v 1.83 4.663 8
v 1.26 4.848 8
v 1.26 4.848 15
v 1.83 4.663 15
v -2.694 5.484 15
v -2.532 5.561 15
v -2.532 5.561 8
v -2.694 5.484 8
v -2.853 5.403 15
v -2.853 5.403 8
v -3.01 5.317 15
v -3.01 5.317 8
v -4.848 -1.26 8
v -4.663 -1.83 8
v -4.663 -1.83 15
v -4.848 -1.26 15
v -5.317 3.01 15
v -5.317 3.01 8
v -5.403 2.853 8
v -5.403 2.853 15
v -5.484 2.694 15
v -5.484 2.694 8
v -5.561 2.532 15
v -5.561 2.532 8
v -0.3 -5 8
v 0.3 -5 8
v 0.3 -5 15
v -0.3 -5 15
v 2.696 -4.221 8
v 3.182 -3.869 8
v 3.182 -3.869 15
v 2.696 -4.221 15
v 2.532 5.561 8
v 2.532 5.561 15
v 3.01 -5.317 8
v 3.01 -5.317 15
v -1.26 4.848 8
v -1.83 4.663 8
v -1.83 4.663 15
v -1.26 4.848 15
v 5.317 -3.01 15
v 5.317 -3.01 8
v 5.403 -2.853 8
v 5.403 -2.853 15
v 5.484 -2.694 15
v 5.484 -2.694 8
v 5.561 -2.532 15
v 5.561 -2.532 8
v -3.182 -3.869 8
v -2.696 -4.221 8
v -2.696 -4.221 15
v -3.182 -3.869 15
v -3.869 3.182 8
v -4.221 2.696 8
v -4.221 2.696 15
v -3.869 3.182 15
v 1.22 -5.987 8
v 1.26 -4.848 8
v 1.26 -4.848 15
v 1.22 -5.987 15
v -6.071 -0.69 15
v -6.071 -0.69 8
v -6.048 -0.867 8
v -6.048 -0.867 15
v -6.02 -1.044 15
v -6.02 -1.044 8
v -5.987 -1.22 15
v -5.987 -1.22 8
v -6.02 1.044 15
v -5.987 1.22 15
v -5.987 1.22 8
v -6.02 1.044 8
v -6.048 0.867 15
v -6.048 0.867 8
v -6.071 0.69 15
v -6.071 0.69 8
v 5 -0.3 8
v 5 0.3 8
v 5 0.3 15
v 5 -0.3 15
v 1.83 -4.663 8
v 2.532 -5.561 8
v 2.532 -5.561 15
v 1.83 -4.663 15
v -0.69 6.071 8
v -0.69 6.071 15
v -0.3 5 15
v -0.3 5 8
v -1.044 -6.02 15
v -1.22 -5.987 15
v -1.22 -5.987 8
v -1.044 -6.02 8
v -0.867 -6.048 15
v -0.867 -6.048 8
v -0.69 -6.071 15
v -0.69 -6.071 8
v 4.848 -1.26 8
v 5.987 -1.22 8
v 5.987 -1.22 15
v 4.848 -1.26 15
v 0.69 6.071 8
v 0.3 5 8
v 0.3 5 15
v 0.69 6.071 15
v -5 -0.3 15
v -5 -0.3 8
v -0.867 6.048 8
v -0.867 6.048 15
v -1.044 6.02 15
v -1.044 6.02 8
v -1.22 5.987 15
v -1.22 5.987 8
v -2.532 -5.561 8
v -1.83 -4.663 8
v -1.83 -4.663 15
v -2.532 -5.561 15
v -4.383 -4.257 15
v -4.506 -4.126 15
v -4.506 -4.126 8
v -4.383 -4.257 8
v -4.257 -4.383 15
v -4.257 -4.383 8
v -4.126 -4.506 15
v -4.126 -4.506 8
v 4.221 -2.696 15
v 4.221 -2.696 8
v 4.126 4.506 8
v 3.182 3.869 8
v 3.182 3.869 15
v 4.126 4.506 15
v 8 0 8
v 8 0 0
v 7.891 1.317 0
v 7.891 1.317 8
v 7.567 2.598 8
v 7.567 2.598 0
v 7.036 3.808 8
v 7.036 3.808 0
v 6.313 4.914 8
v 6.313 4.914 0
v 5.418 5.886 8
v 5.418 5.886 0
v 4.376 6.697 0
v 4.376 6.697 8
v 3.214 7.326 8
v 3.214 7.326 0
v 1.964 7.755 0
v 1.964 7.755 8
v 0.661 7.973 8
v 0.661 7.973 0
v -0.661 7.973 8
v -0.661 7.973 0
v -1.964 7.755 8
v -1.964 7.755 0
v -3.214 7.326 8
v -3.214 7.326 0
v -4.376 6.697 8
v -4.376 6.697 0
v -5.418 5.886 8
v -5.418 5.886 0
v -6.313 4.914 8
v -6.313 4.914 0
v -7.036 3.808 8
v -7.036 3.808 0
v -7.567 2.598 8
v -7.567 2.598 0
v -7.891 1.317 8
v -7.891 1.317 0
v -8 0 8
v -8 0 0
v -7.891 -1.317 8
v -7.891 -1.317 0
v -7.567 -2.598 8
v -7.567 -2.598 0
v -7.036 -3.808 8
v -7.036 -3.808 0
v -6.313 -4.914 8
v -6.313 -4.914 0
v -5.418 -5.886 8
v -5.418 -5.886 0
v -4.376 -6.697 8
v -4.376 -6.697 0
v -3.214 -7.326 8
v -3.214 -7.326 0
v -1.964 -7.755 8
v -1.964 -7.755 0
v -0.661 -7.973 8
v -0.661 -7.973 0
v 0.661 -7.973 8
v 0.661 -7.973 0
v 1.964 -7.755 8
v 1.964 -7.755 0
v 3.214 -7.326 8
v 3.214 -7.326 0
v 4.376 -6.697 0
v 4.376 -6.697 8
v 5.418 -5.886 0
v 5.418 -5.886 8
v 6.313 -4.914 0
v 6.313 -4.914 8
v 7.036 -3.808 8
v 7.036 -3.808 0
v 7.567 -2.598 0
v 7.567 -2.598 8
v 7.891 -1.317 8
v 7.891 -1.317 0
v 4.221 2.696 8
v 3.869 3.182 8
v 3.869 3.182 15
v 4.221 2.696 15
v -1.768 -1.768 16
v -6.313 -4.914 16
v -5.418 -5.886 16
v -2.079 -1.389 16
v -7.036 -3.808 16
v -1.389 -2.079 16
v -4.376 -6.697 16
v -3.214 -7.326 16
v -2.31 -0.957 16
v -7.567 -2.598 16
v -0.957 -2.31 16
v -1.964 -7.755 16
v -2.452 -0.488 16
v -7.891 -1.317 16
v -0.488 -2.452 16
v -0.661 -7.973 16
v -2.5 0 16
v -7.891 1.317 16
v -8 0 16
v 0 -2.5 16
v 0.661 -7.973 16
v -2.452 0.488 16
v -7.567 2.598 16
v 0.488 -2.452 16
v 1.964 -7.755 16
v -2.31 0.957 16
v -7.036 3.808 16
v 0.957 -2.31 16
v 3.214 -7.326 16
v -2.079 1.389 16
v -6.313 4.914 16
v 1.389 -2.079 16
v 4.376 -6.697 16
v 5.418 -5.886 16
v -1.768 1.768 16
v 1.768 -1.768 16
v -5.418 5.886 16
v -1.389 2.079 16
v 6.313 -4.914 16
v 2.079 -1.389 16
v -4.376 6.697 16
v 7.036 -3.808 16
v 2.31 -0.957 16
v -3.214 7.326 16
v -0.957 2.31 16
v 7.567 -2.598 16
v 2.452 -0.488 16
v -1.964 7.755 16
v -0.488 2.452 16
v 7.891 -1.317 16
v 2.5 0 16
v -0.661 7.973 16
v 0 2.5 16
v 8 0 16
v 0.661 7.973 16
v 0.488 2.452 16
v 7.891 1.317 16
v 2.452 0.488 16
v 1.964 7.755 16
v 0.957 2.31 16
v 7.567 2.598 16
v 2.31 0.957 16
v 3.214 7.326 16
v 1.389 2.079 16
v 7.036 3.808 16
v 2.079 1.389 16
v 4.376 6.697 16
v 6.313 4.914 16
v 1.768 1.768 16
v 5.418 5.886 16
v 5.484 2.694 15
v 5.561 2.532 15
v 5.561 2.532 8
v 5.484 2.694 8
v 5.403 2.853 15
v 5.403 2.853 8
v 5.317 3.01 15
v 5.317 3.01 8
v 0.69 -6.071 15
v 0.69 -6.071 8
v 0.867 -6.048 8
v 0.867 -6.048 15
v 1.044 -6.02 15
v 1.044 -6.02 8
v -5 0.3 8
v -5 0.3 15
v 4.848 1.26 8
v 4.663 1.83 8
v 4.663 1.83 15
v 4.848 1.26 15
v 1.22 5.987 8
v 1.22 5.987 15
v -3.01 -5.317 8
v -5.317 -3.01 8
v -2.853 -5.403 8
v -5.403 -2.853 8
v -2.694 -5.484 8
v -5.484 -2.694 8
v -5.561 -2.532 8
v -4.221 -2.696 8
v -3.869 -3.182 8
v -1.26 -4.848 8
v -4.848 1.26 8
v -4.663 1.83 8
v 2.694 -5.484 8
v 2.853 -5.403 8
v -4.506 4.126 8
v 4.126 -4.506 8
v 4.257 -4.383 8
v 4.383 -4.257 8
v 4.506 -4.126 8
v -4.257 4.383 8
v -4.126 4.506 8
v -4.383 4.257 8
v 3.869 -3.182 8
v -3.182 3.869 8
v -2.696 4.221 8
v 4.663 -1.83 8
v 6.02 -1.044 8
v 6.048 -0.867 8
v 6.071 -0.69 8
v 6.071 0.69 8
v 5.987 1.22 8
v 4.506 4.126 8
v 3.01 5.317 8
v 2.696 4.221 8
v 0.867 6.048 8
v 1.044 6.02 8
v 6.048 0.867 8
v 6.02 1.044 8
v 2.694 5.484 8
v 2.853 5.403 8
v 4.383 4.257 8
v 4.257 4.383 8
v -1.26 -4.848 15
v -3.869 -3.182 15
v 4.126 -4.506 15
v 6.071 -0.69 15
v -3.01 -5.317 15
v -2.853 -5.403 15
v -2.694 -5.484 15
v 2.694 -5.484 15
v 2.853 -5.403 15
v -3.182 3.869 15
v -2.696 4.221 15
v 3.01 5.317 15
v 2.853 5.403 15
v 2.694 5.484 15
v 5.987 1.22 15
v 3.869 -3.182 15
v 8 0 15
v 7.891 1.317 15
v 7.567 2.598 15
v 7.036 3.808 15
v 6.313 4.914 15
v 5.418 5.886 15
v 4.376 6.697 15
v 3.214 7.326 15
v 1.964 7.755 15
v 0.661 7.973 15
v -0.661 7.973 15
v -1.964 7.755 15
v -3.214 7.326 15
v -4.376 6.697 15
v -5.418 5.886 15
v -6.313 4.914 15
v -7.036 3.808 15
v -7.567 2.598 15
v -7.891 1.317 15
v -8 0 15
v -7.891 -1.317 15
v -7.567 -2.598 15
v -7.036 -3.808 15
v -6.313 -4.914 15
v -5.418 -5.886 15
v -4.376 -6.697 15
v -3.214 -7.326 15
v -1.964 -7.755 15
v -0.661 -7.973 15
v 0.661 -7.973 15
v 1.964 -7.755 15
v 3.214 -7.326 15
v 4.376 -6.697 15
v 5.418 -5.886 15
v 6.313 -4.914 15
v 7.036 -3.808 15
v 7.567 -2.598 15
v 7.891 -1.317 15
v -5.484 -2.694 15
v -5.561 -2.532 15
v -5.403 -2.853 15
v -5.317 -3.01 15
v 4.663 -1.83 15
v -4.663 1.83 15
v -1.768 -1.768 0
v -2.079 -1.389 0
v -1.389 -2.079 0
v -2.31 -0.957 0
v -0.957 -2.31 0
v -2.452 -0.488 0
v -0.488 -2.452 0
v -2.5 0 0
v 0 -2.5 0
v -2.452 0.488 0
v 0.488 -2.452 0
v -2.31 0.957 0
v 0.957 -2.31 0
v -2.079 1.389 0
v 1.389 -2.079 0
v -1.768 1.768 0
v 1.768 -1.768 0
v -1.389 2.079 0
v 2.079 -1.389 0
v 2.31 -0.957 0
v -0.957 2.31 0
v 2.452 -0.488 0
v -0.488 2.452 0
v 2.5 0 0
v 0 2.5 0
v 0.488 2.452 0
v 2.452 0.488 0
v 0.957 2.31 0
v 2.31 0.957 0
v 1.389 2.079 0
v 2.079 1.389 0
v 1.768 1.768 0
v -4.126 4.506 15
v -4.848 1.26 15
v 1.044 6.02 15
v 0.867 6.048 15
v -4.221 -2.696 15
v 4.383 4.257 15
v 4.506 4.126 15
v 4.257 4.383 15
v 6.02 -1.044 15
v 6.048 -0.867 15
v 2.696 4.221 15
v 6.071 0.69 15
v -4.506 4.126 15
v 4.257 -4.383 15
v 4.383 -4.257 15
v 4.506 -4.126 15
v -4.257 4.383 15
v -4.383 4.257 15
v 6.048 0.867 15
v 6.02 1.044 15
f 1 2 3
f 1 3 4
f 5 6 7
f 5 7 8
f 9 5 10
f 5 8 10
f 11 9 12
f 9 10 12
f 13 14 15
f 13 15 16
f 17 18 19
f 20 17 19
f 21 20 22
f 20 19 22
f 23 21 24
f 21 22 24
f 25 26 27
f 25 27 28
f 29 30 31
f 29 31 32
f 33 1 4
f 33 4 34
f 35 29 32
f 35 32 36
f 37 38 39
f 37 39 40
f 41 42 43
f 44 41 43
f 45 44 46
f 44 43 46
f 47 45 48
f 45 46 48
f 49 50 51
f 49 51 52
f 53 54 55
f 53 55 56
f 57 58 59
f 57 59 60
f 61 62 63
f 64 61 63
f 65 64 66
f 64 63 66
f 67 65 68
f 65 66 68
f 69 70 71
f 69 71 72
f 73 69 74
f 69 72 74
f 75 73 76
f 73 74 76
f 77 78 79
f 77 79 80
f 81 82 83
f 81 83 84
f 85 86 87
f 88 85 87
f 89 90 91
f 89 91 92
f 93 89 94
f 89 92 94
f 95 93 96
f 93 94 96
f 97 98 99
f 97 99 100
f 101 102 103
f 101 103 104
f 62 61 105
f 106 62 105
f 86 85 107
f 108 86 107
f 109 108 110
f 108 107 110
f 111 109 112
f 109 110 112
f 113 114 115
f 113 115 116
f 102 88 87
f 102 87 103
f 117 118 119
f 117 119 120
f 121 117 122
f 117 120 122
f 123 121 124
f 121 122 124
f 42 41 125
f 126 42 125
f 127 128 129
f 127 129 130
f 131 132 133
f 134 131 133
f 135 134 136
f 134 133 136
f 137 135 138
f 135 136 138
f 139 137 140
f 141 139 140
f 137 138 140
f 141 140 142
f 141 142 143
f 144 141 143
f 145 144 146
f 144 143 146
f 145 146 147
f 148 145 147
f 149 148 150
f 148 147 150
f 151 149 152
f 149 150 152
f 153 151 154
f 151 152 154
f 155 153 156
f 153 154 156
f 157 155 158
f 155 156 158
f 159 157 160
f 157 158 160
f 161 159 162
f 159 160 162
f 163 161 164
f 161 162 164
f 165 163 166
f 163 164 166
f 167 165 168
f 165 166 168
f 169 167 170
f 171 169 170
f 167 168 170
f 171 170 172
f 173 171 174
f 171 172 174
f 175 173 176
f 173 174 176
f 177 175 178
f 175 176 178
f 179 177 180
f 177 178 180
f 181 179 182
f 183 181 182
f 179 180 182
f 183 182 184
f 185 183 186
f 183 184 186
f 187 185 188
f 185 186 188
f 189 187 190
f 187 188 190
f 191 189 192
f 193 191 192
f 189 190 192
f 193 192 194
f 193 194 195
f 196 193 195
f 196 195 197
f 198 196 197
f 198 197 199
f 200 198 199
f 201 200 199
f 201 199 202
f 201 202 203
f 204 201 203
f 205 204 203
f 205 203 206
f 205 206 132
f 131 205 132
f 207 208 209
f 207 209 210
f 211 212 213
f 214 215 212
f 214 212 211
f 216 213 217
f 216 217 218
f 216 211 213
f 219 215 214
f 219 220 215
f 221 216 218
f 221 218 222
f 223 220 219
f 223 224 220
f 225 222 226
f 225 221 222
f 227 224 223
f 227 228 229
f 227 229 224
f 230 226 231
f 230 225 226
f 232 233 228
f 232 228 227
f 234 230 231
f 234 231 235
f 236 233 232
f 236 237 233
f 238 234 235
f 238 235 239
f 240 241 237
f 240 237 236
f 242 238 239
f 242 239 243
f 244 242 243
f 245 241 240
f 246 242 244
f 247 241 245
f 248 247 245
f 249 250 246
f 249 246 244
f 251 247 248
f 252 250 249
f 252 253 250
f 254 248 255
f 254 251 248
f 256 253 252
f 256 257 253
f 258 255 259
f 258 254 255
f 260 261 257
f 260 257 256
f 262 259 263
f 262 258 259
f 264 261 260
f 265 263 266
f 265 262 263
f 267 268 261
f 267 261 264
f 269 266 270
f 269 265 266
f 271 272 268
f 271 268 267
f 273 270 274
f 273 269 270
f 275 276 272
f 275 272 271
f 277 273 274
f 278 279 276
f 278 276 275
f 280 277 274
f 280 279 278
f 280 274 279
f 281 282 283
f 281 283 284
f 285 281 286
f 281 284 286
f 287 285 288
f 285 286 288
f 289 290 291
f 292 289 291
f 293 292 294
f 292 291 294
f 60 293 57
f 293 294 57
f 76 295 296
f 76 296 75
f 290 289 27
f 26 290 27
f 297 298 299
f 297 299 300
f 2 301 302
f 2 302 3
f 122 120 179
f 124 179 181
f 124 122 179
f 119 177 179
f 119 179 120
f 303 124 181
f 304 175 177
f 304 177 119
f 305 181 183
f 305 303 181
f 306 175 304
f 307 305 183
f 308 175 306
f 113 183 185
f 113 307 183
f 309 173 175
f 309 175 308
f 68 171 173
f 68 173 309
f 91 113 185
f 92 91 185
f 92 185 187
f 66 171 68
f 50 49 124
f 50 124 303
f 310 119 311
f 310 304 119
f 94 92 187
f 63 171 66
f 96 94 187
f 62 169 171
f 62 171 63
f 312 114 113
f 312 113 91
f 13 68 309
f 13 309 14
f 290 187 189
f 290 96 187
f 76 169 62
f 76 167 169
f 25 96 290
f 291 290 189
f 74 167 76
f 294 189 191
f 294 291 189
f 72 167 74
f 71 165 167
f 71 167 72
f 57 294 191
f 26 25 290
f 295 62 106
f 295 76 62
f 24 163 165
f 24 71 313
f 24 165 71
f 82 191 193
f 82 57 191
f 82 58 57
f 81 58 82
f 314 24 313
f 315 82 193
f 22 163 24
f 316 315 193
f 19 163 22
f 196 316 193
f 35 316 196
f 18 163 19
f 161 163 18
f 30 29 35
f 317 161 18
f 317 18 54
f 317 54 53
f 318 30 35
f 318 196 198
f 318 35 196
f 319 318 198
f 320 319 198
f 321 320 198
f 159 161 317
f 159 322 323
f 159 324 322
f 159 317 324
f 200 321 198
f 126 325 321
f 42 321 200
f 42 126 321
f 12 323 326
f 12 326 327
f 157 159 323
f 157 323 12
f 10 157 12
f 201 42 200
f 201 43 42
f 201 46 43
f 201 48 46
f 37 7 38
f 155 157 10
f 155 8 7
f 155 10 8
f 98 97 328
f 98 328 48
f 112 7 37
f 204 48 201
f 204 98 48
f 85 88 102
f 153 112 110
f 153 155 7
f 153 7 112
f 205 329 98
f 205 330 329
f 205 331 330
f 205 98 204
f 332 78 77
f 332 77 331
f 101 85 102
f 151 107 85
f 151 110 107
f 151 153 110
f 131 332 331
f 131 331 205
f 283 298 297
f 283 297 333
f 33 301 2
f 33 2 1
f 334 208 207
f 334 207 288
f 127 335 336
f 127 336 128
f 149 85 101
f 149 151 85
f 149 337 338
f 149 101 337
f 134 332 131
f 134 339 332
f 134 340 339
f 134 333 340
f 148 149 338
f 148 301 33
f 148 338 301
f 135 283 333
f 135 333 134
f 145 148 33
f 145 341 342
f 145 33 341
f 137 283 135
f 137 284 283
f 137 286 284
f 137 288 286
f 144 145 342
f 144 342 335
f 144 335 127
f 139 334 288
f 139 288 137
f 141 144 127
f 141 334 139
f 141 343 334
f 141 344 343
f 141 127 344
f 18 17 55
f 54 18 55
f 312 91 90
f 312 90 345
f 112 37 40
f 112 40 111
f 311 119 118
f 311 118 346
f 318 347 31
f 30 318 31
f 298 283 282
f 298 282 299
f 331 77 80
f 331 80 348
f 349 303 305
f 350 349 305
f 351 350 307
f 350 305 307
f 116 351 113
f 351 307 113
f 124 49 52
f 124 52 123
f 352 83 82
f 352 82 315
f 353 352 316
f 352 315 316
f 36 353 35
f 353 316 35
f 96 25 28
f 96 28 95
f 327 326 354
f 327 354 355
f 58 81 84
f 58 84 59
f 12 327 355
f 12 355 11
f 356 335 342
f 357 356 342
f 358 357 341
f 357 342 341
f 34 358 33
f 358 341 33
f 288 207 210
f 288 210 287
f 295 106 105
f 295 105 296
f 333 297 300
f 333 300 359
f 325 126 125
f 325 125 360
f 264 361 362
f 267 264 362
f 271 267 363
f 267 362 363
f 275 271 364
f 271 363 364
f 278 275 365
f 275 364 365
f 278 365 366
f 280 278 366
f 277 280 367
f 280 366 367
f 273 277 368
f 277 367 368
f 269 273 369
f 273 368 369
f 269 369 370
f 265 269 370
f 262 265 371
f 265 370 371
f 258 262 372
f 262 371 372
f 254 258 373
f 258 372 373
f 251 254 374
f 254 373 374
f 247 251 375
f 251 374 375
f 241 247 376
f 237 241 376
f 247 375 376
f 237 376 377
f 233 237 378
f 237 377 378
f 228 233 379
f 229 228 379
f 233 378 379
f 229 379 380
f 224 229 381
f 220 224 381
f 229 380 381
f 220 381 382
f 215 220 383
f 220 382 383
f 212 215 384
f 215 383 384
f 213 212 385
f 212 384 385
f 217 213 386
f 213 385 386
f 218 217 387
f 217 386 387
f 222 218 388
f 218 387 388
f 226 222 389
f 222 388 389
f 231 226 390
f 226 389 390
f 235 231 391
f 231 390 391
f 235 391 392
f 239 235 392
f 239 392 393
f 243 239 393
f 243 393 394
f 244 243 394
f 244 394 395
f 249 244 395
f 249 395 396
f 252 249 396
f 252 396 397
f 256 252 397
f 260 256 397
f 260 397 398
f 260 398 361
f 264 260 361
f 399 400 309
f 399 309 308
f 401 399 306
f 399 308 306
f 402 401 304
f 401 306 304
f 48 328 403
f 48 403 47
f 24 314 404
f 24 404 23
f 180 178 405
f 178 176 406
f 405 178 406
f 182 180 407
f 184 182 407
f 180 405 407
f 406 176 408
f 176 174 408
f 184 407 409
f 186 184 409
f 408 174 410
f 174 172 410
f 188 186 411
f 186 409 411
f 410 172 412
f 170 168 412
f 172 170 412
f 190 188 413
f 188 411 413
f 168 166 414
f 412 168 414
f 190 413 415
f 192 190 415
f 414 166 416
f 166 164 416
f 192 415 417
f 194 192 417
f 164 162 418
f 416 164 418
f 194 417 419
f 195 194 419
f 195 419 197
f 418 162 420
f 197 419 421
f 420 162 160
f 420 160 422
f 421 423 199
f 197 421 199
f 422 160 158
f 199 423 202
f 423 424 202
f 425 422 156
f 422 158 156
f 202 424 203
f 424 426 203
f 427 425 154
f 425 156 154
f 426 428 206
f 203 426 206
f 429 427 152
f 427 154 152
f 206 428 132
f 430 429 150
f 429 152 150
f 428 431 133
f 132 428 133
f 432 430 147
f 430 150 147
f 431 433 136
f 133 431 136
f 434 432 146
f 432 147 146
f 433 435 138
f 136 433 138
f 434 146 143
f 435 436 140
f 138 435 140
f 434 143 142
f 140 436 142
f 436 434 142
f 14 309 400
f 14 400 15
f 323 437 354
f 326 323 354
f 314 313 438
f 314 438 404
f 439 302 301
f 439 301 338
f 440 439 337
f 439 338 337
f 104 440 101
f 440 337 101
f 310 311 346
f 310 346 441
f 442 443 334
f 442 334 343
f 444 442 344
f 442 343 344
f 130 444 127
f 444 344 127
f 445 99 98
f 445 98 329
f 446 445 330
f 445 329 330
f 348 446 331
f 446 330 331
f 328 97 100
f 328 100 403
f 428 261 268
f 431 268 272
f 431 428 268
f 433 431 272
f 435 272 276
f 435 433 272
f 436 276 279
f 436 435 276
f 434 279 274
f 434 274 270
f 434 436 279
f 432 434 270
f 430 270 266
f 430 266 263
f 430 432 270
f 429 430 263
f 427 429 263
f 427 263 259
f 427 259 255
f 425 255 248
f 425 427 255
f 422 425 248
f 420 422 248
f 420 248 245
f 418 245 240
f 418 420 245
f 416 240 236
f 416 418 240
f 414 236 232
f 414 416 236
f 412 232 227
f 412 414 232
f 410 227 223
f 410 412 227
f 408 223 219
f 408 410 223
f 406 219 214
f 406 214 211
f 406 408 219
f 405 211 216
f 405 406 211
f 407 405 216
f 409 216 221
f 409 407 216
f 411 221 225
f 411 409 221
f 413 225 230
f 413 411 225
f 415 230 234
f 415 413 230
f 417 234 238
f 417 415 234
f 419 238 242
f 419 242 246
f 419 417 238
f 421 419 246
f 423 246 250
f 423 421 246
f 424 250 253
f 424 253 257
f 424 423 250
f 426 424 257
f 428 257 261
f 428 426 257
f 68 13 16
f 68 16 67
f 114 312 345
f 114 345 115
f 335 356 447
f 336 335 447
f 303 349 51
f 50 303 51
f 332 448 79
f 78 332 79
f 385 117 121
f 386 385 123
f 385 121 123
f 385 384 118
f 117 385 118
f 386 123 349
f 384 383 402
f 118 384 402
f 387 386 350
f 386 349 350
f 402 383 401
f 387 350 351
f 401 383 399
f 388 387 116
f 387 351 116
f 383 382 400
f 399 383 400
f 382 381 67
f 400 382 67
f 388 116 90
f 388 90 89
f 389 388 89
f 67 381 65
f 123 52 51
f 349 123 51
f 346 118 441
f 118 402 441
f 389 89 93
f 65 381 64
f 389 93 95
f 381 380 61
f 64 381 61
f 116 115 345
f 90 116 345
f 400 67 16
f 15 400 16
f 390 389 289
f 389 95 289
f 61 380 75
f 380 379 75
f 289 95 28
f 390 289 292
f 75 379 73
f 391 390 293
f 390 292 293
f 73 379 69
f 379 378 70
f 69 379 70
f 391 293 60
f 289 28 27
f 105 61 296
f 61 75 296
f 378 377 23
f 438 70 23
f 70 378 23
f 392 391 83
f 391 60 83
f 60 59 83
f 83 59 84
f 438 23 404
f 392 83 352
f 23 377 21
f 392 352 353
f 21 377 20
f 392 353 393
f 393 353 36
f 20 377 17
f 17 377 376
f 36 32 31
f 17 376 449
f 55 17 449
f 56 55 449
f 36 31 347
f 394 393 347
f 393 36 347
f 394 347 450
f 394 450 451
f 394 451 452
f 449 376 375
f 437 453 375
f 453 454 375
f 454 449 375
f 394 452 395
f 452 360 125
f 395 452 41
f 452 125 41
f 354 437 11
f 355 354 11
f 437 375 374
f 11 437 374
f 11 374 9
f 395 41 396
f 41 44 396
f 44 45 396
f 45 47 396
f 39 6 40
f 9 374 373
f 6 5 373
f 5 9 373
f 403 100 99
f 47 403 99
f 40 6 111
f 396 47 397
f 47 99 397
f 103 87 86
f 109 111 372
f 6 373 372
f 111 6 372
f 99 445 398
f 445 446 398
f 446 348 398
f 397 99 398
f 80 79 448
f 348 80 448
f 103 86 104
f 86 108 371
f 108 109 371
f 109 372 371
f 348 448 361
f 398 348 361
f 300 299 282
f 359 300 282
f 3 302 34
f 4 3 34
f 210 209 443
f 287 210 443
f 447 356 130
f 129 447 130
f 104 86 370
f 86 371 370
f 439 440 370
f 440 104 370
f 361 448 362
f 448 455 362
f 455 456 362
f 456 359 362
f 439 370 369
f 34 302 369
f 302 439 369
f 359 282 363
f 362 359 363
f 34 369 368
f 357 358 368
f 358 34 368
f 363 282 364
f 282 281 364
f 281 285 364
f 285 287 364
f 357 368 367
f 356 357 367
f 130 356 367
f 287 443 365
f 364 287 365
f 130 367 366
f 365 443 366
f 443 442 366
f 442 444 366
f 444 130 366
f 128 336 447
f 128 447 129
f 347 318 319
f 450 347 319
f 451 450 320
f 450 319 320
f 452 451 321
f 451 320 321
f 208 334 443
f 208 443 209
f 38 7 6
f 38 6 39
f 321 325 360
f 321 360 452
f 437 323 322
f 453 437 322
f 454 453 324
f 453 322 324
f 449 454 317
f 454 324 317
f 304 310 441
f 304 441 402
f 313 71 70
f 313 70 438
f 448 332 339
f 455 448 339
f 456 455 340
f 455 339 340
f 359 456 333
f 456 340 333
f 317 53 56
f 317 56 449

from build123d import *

# Parameters (mm, degrees)
SKETCH_1_R               = 6.11
SKETCH_1_R_2             = 2.5
EXTRUDE_1_DEPTH          = 16
SKETCH_1_3_R             = 8
SKETCH_1_3_R_2           = 6.11
EXTRUDE_2_DEPTH          = 8
EXTRUDE_START            = -1
SKETCH_2_R               = 8
SKETCH_2_R_2             = 6.11
EXTRUDE_3_DEPTH          = 1
CUT_EXTRUDE_5_DEPTH      = 7
PATTERN_CIRCULAR_1_COUNT = 20


with BuildPart() as part:
    # Эскиз1 → Бобышка-Вытянуть1 (new body)
    with BuildSketch(Plane.XY):
        Circle(SKETCH_1_R)
        Circle(SKETCH_1_R_2, mode=Mode.SUBTRACT)
    extrude(amount=EXTRUDE_1_DEPTH)

    # Эскиз1<3> → Бобышка-Вытянуть2 (add)
    with BuildSketch(Plane.XY):
        Circle(SKETCH_1_3_R)
        Circle(SKETCH_1_3_R_2, mode=Mode.SUBTRACT)
    extrude(amount=EXTRUDE_2_DEPTH)

    # Эскиз2 → Бобышка-Вытянуть3 (add)
    with BuildSketch(Plane.XY.offset(16).offset(EXTRUDE_START)):
        Circle(SKETCH_2_R)
        Circle(SKETCH_2_R_2, mode=Mode.SUBTRACT)
    extrude(amount=EXTRUDE_3_DEPTH)

    # Эскиз3 → Вырез-Вытянуть5 (cut)
    with BuildSketch(Plane.XY.offset(8)):
        with BuildLine():
            Line((-0.3, 5), (0.3, 5))
            Line((0.3, 5), (0.70385757, 6.109589554))
            ThreePointArc((0.70385757, 6.109589554), (0, 6.15), (-0.70385757, 6.109589554))
            Line((-0.70385757, 6.109589554), (-0.3, 5))
        make_face()
    cut_extrude_5 = extrude(amount=CUT_EXTRUDE_5_DEPTH, mode=Mode.SUBTRACT)

    # Круговой массив1: Вырез-Вытянуть5 ×20 about axis
    pattern_circular_1_axis = Axis((0, 0, 0), (0, 0, 1))
    for i in range(1, PATTERN_CIRCULAR_1_COUNT):
        add(cut_extrude_5.rotate(pattern_circular_1_axis, i * 360 / PATTERN_CIRCULAR_1_COUNT), mode=Mode.SUBTRACT)


solid = part.part
